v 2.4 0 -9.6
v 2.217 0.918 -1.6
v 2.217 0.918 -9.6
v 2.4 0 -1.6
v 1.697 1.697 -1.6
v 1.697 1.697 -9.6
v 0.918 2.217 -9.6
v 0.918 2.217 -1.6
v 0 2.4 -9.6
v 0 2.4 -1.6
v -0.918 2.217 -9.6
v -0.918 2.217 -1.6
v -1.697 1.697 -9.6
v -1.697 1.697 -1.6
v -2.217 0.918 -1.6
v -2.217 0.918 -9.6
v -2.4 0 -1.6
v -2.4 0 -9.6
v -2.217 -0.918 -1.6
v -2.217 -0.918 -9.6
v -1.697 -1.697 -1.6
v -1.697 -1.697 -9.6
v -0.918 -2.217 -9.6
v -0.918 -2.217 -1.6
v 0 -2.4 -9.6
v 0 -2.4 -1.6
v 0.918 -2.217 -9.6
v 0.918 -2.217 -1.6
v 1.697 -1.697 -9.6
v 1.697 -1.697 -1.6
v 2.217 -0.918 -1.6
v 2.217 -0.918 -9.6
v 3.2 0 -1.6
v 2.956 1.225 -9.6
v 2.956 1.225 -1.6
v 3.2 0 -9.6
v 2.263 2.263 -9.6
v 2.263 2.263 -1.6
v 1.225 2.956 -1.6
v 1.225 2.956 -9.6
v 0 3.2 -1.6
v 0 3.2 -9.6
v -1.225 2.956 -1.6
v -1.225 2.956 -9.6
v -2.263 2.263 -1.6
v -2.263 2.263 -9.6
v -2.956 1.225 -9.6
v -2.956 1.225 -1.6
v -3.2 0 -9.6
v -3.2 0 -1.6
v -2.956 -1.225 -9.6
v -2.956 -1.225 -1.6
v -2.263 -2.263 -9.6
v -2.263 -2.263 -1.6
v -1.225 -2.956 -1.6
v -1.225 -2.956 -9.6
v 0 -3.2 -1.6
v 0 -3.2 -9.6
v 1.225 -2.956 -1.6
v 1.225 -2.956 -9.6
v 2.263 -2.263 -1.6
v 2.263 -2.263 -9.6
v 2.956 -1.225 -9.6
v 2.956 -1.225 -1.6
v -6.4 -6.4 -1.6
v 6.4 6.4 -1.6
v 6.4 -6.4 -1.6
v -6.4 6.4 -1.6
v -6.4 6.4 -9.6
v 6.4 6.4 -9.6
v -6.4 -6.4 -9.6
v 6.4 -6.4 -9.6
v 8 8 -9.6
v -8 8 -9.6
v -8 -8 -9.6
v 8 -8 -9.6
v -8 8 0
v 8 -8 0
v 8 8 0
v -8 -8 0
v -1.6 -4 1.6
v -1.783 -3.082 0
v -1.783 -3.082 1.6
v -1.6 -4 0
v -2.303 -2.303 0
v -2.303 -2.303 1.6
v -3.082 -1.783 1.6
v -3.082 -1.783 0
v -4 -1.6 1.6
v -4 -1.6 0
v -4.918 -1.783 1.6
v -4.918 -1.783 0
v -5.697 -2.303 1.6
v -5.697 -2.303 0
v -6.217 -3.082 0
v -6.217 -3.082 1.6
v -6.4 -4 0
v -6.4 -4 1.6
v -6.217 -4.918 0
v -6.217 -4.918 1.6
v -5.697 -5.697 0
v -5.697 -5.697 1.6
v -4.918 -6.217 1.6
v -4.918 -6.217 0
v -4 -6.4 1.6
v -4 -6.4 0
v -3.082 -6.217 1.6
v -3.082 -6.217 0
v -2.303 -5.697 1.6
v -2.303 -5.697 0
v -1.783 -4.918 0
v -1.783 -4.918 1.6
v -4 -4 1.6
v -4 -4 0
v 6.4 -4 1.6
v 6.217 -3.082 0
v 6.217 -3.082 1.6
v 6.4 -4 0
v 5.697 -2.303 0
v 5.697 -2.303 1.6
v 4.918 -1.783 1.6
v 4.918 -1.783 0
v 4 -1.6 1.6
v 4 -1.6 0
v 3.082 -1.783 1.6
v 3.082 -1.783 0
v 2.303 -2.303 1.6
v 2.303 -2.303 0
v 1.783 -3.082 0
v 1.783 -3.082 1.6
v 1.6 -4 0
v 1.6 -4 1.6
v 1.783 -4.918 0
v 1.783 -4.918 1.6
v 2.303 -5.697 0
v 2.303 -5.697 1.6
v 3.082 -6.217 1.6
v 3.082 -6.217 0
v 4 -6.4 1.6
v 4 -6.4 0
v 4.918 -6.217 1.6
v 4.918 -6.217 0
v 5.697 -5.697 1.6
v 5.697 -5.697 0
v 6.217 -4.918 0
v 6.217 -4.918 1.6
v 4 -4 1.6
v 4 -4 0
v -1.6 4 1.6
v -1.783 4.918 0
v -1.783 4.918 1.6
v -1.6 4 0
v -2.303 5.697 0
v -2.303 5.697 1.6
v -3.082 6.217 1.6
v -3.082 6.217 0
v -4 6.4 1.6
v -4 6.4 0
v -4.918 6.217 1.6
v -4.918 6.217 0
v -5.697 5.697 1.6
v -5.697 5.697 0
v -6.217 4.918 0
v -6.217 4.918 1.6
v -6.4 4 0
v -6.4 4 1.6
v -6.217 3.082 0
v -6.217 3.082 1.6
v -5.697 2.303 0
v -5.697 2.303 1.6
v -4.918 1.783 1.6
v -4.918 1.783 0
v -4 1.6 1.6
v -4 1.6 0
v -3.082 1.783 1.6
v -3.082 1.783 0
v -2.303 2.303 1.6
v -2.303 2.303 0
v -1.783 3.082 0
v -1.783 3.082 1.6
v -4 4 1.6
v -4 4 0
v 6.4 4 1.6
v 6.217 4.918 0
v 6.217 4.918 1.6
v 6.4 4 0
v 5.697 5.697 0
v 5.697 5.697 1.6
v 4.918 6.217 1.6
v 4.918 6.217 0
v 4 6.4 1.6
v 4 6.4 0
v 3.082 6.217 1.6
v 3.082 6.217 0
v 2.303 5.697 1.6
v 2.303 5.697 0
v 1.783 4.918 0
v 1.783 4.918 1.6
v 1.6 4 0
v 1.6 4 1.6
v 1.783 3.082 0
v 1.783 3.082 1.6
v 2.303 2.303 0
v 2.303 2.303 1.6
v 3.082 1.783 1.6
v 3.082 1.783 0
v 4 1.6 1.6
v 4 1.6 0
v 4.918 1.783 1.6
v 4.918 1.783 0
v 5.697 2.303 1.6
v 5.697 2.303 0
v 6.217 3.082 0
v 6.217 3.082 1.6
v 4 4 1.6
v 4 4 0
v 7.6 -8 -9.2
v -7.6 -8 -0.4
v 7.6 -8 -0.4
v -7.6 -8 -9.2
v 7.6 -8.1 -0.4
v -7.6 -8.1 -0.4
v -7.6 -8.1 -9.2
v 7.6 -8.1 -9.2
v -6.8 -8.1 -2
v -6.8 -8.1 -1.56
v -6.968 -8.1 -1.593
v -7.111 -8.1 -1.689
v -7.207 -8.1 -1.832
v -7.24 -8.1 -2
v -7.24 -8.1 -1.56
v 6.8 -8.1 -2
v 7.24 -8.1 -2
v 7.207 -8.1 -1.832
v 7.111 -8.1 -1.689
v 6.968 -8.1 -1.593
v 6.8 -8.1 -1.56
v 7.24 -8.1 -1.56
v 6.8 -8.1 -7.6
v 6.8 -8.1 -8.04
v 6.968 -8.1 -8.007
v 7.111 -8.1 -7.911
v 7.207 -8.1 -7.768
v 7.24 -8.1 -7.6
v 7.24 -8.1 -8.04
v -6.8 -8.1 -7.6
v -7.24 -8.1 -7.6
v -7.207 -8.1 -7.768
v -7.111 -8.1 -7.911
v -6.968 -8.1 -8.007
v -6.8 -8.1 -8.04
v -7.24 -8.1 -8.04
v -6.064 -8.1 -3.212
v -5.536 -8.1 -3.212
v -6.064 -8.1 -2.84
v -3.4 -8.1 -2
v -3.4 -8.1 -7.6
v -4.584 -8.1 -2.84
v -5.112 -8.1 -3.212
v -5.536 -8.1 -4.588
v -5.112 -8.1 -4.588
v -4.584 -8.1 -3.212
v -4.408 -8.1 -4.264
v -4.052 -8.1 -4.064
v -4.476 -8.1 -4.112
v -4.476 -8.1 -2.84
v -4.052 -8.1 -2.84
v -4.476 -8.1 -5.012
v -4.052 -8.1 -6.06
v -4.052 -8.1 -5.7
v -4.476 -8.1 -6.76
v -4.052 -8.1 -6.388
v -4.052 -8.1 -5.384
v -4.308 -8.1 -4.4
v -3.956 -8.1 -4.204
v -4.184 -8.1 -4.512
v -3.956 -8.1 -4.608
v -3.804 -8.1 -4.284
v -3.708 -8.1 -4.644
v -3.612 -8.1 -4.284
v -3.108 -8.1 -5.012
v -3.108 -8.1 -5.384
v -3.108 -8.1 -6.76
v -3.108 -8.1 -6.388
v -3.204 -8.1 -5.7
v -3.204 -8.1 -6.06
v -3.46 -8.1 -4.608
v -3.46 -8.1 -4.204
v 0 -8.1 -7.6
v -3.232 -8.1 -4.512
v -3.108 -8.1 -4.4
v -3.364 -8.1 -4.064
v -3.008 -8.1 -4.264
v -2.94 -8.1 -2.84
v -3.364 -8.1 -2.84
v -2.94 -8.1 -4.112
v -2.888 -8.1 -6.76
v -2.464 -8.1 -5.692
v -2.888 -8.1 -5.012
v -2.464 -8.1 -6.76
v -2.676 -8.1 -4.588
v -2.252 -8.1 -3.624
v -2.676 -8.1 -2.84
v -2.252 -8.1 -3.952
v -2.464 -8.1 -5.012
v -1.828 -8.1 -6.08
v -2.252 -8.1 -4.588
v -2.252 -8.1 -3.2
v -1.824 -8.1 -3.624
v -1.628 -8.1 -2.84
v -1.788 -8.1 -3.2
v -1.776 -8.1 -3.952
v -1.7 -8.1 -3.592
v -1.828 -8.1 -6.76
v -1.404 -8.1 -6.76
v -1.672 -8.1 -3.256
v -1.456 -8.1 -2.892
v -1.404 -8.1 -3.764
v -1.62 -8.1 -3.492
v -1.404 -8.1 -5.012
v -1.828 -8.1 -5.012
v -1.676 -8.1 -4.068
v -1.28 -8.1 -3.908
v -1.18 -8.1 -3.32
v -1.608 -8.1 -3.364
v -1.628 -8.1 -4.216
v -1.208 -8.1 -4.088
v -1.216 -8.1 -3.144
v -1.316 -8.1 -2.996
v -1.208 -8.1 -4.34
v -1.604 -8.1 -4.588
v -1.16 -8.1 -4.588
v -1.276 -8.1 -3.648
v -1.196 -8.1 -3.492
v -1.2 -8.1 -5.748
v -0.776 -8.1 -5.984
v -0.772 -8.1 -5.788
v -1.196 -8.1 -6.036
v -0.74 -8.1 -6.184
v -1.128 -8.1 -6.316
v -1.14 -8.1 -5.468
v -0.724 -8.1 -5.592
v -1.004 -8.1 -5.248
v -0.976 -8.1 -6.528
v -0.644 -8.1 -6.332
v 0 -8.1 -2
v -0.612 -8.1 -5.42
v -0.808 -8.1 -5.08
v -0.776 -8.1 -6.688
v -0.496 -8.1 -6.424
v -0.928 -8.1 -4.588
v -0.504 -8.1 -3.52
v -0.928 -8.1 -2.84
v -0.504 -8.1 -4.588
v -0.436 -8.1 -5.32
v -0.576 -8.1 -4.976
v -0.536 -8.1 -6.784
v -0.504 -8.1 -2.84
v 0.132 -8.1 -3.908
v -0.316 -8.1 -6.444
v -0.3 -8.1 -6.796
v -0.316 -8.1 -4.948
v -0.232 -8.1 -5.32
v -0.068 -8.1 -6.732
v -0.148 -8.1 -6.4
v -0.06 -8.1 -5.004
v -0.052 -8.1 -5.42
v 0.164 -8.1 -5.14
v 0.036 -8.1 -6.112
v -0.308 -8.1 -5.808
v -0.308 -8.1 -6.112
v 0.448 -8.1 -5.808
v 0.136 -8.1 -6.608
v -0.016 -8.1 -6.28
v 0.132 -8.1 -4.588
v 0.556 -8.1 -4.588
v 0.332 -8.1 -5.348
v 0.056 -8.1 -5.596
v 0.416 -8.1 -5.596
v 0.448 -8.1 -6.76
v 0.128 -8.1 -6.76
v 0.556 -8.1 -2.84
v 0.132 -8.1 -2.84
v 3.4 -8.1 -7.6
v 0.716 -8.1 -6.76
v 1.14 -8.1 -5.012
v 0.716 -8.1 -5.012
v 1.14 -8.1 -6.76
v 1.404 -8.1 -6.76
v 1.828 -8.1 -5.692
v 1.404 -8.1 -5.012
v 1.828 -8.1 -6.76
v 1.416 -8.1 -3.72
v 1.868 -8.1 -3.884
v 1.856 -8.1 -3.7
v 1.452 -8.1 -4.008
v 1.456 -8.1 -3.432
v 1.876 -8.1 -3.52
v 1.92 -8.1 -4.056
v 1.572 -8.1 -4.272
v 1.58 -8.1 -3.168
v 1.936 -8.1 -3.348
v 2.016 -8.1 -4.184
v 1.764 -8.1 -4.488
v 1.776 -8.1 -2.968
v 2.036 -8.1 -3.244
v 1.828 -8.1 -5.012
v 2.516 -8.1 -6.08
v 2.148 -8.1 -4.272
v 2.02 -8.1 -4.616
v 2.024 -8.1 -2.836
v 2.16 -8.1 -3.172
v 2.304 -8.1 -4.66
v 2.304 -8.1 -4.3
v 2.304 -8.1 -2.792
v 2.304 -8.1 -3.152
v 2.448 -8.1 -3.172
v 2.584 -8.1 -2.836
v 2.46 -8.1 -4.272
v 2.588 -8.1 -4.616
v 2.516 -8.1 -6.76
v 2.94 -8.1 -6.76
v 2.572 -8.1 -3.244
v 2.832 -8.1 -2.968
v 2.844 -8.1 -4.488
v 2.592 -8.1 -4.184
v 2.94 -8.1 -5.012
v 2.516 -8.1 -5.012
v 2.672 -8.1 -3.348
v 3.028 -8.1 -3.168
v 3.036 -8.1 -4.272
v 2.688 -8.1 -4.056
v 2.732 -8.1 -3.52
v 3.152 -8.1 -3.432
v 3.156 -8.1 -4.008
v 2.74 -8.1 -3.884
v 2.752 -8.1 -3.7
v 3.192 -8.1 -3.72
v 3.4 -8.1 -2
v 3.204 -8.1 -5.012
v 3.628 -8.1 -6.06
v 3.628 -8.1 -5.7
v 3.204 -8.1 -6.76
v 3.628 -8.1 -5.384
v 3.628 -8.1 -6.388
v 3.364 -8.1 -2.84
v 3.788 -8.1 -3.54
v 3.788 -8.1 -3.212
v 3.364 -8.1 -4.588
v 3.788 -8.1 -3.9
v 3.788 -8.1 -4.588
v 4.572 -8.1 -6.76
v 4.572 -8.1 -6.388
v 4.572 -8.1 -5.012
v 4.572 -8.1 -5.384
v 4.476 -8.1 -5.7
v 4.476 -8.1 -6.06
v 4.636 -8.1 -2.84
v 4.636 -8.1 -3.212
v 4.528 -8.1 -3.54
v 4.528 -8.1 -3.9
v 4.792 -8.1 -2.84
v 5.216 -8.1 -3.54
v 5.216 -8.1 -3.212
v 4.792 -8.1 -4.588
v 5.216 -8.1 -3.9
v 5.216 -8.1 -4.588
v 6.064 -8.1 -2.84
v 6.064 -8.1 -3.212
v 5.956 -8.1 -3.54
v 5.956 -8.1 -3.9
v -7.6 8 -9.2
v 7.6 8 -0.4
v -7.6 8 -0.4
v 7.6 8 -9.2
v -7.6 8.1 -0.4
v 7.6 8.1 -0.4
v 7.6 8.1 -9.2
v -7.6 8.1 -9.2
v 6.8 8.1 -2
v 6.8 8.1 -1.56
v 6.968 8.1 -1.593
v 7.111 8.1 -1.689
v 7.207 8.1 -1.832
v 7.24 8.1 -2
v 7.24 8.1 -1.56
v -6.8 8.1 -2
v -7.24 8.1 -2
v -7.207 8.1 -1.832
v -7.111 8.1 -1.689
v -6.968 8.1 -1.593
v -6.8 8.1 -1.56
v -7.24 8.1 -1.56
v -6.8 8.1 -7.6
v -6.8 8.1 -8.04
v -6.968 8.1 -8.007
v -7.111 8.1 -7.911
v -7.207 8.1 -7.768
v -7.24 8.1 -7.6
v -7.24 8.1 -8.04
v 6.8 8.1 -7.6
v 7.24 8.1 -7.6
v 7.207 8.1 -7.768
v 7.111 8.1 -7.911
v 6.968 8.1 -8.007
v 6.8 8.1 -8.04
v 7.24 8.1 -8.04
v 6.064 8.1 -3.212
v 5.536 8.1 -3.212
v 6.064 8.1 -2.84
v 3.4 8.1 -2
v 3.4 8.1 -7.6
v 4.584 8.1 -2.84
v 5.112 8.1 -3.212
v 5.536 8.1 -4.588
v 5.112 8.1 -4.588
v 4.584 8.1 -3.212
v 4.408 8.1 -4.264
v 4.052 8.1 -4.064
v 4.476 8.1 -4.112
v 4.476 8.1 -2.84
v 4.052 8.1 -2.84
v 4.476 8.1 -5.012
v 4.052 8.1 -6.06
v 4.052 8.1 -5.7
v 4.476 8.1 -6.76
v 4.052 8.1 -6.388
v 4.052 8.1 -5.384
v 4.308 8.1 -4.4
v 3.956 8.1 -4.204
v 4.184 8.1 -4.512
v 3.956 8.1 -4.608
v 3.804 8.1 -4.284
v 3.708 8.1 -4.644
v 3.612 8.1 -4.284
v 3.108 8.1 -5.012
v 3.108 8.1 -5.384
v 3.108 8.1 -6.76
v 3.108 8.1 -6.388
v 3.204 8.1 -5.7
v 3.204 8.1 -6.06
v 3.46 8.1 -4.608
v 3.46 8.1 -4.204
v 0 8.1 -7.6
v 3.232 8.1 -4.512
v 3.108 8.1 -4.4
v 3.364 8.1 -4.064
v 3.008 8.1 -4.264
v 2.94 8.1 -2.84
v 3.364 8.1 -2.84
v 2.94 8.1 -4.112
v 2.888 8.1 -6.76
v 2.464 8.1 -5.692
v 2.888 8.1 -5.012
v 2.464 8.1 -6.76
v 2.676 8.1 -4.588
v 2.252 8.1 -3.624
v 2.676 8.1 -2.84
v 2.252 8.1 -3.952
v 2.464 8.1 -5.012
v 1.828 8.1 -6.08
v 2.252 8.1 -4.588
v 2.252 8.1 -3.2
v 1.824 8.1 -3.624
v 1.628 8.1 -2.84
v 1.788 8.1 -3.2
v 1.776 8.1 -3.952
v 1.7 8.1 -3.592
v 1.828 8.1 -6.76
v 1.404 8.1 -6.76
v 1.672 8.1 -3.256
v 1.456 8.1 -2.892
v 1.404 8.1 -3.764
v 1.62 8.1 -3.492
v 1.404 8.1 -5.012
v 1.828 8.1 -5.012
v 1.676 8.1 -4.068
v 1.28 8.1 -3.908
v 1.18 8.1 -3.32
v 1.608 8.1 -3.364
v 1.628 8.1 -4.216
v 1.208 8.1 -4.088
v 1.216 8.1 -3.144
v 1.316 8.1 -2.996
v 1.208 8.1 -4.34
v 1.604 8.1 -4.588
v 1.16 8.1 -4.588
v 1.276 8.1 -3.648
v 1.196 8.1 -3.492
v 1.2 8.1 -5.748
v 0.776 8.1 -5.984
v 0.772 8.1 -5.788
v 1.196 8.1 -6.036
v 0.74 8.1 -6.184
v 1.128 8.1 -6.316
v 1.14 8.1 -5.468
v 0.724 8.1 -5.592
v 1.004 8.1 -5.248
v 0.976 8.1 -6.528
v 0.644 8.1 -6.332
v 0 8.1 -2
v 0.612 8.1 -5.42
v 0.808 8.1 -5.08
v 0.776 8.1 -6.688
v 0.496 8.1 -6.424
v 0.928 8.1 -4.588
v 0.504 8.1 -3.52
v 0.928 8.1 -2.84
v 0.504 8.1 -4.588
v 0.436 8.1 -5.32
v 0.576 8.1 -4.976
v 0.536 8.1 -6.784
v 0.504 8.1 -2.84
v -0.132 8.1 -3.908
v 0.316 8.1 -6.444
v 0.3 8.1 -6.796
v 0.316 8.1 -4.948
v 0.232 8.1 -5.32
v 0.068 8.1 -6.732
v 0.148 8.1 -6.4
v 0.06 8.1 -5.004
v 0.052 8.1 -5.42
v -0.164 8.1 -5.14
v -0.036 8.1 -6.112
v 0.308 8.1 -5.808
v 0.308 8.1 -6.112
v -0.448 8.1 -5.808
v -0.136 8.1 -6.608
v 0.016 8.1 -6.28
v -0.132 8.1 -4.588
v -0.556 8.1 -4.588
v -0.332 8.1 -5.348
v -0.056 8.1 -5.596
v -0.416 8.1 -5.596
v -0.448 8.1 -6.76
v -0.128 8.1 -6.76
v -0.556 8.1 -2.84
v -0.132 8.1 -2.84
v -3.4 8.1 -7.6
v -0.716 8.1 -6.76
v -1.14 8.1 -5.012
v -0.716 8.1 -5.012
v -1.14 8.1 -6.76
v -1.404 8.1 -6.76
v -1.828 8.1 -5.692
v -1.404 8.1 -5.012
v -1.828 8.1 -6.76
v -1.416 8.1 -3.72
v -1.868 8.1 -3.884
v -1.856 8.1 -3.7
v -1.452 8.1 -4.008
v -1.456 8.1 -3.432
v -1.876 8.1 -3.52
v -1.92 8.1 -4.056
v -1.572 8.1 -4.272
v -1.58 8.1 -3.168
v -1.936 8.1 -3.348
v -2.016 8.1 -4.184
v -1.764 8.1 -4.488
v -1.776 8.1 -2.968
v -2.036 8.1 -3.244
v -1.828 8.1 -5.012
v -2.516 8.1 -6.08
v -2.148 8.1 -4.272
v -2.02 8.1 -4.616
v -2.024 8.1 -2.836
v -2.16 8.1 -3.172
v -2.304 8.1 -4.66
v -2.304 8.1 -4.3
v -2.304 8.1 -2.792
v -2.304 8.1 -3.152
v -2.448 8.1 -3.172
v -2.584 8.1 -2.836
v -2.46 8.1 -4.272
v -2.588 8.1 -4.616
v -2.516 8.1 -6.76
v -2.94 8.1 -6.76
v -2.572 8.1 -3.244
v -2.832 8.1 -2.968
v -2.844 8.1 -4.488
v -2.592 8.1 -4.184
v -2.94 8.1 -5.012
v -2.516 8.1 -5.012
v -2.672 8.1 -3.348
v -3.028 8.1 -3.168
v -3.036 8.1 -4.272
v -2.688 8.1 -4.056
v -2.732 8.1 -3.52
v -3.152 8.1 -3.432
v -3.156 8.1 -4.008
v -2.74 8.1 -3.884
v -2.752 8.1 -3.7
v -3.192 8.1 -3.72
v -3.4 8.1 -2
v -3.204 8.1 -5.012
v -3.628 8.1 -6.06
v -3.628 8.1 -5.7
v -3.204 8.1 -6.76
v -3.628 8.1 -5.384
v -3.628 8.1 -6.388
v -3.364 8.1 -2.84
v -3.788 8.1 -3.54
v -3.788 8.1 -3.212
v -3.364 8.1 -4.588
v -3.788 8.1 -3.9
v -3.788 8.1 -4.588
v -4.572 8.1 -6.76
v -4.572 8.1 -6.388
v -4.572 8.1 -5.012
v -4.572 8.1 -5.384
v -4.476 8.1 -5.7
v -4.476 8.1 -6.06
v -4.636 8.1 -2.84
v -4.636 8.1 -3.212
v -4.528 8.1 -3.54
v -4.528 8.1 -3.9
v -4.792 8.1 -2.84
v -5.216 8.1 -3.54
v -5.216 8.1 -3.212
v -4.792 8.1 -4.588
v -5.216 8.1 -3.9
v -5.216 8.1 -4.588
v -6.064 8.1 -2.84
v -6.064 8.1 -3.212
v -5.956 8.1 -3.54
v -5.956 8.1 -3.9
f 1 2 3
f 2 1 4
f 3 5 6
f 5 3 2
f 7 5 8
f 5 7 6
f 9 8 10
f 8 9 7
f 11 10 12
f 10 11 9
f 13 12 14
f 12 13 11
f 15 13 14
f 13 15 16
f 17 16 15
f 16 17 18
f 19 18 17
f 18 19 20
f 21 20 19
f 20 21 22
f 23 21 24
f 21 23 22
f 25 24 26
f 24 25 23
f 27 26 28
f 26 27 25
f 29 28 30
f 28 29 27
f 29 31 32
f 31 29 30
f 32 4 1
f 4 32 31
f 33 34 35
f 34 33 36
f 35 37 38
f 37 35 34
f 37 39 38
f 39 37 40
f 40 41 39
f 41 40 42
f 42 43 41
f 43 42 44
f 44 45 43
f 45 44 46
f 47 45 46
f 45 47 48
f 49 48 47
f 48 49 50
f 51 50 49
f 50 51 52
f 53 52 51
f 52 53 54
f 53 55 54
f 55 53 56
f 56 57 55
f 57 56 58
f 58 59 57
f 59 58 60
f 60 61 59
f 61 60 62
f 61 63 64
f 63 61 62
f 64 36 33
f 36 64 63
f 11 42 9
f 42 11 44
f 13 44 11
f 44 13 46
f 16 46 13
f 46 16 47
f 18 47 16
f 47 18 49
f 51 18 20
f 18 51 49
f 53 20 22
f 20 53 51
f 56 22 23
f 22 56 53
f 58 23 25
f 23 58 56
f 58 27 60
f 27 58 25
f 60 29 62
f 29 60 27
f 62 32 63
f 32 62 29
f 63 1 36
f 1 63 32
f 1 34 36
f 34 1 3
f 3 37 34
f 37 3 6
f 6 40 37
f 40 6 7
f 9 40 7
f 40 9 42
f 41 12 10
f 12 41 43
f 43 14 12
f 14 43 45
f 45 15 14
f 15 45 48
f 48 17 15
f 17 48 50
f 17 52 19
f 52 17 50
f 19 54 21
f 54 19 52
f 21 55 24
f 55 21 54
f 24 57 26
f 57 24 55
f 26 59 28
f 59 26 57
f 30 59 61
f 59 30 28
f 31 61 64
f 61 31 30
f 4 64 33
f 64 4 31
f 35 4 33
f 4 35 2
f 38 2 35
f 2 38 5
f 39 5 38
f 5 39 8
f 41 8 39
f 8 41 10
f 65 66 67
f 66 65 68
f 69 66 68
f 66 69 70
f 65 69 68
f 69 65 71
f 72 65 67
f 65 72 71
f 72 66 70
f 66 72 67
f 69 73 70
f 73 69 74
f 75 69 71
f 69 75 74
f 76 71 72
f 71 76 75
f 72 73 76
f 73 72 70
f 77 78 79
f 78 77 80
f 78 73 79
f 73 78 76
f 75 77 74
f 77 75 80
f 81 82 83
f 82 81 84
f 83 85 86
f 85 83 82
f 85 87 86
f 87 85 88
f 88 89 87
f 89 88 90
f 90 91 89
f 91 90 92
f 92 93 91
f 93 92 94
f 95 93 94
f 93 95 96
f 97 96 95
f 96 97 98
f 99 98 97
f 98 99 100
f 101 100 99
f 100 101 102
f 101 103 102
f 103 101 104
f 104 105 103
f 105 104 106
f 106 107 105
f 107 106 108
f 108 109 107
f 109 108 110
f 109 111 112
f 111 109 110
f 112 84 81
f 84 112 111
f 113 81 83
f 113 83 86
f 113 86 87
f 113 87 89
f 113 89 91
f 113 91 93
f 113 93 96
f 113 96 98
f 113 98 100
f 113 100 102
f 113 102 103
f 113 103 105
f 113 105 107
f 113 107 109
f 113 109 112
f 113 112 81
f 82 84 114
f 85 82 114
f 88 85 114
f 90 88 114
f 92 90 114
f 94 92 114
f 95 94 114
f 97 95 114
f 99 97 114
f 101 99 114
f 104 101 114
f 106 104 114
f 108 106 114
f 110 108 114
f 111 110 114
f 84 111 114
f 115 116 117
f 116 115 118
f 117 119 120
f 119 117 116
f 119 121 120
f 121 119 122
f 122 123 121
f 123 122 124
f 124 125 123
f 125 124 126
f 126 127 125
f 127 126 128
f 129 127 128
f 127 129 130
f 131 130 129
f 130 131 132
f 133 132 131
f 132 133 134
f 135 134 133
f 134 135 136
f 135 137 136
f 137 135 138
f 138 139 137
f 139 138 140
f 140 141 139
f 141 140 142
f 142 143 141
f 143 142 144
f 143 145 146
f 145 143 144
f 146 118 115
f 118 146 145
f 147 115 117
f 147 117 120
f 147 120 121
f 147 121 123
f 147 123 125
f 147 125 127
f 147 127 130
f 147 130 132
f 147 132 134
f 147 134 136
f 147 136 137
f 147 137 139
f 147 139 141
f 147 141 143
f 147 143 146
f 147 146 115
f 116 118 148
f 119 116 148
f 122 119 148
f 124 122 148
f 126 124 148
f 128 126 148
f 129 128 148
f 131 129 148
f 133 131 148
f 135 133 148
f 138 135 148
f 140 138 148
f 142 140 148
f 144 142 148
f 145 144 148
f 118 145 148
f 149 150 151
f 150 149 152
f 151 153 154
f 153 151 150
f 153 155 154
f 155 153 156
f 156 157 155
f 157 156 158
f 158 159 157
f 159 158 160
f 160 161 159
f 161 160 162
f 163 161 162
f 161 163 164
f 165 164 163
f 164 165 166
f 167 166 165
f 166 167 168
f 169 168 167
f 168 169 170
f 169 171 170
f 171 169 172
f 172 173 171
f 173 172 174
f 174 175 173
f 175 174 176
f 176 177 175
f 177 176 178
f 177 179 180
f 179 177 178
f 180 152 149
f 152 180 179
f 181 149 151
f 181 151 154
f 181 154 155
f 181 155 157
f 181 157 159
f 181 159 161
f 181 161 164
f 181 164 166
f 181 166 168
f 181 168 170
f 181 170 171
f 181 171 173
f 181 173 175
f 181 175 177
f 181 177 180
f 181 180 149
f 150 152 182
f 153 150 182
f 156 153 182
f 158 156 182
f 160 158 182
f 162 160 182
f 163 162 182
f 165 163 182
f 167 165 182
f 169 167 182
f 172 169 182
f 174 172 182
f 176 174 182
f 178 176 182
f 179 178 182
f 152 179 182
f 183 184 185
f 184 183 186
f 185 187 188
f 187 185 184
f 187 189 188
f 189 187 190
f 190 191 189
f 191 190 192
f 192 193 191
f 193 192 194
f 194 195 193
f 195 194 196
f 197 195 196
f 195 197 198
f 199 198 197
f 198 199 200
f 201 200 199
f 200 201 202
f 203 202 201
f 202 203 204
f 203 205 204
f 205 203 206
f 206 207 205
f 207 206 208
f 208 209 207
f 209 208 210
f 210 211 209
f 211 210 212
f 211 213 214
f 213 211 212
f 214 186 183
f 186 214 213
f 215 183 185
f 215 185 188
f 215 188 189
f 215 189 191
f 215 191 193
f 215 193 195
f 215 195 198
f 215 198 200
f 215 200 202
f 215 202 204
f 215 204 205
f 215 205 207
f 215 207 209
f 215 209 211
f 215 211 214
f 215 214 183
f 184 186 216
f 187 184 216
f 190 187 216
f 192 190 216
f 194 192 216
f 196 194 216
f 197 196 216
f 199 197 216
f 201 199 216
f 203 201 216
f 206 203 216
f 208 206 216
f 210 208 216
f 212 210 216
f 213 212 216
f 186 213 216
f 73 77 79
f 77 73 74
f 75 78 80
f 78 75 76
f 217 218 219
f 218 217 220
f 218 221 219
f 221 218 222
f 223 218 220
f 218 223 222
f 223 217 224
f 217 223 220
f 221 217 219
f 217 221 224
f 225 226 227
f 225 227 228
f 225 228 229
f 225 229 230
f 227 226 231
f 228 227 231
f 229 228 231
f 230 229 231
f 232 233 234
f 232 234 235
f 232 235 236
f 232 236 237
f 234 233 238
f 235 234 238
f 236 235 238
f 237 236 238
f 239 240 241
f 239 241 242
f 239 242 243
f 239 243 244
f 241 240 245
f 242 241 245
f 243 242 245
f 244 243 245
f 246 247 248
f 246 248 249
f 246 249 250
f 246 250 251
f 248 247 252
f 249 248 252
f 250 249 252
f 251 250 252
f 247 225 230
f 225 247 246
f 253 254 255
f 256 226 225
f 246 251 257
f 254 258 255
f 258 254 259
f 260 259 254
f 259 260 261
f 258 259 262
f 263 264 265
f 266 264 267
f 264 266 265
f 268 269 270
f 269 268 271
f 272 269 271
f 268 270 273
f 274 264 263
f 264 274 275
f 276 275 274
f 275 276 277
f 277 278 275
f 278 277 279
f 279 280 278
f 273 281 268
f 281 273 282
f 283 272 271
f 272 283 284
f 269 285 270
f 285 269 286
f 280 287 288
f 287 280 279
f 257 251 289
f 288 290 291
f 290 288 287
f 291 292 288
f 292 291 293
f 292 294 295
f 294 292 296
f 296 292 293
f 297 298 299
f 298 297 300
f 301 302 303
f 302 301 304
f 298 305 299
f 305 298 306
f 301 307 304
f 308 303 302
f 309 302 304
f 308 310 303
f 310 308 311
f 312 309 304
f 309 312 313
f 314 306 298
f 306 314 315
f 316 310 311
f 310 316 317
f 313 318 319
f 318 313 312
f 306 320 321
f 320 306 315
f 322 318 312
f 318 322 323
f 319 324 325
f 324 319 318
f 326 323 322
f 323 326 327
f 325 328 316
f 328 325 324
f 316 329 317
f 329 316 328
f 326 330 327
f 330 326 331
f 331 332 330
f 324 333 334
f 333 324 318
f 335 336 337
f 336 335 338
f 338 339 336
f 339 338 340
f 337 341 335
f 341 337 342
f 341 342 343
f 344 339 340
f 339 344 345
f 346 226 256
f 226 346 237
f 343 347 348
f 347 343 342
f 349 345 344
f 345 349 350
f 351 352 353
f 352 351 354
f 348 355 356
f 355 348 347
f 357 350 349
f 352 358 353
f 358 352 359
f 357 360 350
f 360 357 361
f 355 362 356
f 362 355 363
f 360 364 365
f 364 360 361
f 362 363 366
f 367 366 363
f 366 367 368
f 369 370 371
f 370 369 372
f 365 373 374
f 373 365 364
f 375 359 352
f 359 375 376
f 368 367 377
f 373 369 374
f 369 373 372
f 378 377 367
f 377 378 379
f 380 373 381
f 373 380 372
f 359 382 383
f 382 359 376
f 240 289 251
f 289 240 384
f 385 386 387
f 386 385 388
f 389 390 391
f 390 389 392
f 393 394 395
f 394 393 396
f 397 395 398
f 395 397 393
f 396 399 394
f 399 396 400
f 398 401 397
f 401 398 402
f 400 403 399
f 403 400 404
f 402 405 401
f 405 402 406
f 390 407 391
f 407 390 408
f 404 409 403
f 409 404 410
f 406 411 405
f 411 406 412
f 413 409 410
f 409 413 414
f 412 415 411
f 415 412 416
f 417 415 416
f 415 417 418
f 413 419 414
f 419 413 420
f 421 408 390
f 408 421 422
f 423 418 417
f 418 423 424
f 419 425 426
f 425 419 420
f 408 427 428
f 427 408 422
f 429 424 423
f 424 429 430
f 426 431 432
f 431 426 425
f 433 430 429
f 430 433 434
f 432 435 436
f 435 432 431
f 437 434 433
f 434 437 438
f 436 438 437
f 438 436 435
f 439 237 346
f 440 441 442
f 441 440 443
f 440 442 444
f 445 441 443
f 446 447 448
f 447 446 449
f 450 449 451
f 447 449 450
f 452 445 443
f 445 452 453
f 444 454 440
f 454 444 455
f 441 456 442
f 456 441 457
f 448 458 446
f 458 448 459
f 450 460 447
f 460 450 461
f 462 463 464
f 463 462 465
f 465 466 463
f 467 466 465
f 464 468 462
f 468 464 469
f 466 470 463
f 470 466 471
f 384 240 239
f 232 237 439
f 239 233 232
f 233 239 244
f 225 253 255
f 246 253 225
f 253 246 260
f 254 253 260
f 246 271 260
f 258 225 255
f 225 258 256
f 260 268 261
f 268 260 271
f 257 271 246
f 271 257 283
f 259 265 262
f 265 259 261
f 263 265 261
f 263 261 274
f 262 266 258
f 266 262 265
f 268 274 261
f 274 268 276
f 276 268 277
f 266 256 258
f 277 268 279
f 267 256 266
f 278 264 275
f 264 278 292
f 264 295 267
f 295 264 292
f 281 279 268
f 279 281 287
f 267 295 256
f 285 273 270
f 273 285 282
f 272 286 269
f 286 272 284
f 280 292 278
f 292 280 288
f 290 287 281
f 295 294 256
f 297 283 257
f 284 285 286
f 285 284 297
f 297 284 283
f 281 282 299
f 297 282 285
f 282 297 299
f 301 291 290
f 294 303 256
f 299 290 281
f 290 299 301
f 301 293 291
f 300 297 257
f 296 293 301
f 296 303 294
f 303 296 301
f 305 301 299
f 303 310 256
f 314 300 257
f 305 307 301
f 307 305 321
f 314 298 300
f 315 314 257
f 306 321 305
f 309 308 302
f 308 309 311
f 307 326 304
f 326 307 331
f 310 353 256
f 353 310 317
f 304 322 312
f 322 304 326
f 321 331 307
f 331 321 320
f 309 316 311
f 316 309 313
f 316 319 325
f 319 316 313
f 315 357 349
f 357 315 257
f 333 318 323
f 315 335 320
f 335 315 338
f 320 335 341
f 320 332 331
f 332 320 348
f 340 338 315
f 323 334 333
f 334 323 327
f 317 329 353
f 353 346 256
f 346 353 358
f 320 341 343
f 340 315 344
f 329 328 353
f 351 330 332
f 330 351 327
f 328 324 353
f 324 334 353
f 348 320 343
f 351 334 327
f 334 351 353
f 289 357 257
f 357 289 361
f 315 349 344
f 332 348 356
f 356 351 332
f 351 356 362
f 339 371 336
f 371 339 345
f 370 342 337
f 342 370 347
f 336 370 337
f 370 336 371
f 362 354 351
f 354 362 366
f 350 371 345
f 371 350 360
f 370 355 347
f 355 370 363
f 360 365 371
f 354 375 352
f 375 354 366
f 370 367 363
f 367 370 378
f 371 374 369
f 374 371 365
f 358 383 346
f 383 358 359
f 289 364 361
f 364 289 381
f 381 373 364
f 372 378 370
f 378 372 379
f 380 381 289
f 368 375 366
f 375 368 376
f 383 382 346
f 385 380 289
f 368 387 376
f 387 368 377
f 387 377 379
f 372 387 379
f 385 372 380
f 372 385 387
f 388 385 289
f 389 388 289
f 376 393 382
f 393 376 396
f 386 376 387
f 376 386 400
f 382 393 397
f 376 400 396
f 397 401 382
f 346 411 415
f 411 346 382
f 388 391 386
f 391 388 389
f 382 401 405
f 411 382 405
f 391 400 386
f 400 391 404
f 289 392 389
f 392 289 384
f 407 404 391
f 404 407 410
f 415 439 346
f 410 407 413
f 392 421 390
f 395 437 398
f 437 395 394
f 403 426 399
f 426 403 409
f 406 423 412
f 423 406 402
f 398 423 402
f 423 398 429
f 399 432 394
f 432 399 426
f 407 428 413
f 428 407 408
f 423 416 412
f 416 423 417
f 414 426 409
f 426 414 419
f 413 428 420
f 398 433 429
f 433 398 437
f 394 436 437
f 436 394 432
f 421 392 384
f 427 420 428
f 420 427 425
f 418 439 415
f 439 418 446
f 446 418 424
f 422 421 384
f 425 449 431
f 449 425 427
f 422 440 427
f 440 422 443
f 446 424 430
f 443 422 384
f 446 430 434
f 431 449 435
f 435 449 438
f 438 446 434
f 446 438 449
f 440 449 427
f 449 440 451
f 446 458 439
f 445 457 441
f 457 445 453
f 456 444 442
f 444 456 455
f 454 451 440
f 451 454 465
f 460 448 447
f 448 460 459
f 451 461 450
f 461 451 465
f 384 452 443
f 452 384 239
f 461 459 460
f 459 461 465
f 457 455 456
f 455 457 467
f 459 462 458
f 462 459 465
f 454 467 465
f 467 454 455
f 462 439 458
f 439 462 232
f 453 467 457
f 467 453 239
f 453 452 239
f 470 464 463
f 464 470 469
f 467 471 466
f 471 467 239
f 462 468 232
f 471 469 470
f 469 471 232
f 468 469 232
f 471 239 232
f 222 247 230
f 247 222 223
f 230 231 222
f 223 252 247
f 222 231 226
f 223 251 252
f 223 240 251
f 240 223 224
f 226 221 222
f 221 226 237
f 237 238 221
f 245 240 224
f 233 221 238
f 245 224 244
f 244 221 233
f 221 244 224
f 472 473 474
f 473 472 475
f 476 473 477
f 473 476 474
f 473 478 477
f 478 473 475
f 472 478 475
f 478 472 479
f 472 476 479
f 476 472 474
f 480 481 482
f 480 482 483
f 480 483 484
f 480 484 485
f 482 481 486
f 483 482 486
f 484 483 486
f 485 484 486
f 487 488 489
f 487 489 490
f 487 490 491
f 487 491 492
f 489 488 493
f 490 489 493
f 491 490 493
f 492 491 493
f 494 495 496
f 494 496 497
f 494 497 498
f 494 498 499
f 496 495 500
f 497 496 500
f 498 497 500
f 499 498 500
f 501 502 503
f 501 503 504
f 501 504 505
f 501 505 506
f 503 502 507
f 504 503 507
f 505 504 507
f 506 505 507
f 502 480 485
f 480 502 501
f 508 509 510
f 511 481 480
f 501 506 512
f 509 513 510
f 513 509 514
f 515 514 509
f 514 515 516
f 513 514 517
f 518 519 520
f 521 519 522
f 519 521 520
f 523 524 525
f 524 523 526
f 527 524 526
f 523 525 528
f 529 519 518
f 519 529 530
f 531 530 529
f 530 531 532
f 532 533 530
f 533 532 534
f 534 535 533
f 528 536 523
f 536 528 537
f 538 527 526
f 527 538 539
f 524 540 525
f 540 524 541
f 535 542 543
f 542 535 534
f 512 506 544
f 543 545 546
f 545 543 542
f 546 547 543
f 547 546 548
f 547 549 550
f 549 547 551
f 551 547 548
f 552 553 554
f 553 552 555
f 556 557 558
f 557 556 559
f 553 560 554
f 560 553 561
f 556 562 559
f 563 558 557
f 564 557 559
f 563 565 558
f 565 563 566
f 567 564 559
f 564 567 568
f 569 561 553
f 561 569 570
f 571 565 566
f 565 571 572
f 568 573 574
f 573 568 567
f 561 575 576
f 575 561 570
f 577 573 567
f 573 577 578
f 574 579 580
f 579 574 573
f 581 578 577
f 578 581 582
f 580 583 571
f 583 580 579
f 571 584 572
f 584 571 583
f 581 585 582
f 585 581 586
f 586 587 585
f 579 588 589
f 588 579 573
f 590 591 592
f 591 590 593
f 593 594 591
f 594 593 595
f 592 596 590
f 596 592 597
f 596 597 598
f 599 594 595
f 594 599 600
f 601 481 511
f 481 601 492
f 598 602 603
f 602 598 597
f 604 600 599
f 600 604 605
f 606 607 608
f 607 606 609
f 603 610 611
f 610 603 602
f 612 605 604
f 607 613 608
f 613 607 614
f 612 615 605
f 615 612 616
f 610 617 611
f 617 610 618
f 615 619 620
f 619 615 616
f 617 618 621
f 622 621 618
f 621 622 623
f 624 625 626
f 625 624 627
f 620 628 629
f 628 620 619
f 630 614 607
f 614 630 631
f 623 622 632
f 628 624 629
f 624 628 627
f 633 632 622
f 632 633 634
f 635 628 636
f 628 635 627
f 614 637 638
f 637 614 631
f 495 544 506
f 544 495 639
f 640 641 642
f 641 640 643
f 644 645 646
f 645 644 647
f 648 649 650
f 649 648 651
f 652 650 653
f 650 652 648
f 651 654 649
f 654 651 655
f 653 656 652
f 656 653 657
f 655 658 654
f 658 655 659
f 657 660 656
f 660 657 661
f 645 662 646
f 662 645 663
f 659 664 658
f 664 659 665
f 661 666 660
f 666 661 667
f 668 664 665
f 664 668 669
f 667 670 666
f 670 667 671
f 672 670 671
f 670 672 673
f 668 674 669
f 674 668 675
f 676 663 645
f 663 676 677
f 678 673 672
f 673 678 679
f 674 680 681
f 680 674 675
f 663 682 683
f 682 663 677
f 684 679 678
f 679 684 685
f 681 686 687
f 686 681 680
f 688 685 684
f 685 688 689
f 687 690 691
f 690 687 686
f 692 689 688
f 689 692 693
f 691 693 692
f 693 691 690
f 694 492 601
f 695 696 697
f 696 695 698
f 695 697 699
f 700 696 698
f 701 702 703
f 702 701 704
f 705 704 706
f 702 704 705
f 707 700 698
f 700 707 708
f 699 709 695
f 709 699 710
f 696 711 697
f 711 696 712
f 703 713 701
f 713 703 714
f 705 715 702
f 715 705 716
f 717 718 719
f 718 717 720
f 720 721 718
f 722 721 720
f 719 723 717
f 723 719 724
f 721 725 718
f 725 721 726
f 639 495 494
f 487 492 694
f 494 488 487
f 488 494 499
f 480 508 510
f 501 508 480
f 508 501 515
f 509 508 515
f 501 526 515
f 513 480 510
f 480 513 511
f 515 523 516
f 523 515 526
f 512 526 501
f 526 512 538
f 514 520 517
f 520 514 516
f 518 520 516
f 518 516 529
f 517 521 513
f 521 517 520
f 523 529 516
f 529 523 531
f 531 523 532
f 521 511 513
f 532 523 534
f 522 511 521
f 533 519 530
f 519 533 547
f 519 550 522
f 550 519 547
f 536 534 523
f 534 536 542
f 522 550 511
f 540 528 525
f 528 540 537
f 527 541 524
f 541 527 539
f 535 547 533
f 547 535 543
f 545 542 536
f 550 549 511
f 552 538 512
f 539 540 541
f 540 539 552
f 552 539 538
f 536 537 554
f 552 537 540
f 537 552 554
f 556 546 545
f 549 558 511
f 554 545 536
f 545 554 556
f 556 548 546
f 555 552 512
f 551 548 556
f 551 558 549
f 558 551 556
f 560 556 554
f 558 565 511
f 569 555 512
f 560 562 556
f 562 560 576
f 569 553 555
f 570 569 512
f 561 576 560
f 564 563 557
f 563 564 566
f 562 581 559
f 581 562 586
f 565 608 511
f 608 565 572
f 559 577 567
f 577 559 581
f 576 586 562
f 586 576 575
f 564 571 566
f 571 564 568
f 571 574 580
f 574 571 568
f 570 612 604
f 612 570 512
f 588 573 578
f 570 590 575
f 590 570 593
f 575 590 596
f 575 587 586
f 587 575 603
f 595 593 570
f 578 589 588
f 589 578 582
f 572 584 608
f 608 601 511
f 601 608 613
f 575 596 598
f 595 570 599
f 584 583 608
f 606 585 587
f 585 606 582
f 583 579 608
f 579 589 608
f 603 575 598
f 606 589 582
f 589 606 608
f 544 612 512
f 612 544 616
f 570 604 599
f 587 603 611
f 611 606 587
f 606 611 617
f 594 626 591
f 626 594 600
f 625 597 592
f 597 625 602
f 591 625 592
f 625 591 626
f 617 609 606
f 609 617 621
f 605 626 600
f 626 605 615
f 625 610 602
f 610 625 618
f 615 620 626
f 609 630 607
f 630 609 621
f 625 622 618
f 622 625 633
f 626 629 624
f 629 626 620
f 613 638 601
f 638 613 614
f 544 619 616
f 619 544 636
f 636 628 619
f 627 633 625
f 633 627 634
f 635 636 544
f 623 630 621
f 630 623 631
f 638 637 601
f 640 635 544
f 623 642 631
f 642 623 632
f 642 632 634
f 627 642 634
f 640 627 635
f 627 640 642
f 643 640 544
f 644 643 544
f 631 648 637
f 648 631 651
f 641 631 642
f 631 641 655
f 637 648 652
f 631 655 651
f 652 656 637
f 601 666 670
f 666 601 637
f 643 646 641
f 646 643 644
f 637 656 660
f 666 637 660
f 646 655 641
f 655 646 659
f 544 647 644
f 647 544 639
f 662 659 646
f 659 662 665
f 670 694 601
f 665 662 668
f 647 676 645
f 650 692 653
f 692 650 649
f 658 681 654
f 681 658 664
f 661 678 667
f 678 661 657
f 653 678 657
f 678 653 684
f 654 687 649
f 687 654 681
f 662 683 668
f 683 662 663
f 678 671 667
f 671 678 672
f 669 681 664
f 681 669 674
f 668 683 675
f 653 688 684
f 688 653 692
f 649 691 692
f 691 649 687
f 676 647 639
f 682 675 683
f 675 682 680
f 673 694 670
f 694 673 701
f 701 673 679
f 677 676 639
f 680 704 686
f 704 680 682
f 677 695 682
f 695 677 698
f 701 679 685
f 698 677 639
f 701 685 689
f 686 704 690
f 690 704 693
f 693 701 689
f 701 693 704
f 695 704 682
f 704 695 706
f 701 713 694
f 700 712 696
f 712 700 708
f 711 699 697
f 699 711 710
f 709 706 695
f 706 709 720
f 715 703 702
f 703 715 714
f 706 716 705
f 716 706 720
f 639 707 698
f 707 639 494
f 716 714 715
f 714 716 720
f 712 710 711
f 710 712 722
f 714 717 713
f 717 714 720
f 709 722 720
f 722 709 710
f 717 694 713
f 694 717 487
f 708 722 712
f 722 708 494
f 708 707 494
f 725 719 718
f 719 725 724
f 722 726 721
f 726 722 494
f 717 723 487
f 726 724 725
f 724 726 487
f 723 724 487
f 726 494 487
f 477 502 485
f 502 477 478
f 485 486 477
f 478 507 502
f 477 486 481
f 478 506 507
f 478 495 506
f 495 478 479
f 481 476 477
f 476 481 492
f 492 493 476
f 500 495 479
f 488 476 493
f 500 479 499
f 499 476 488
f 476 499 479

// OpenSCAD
use <../lib.scad>
use <192375g.scad>
use <3003.scad>
function ldraw_lib__3003d02() = [
// 0 Brick  2 x  2 with "TURN OFF ENGINE" Sticker on Both Sides
// 0 Name: 3003d02.dat
// 0 Author: Takeshi Takahashi [RainbowDolphin]
// 0 !LDRAW_ORG Shortcut UPDATE 2024-05
// 0 !LICENSE Licensed under CC BY 4.0 : see CAreadme.txt
// 
// 0 BFC CERTIFY CCW
  [0,"BFC","CERTIFY"],
  [0,"BFC","CCW"],
// 
// 0 !CATEGORY Sticker Shortcut
// 0 !KEYWORDS Bricklink 3003pb020, Gas Station, Set 6375-2
// 
// 0 !HISTORY 2024-06-30 [OrionP] Official Update 2024-05
// 
// 1 16 0 0 0 1 0 0 0 1 0 0 0 1 3003.dat
  [1,16,0,0,0,1,0,0,0,1,0,0,0,1, ldraw_lib__3003()],
// 1 16 0 12 -20 1 0 0 0 0 -1 0 1 0 192375g.dat
  [1,16,0,12,-20,1,0,0,0,0,-1,0,1,0, ldraw_lib__192375g()],
// 1 16 0 12 20 -1 0 0 0 0 -1 0 -1 0 192375g.dat
  [1,16,0,12,20,-1,0,0,0,0,-1,0,-1,0, ldraw_lib__192375g()],
];
module ldraw_lib__3003d02(step=0, col=false, unit=2/5, alt=false, line=0.2, solid=!$preview)
    makepoly(ldraw_lib__3003d02(), step=step, col=col, unit=unit, alt=alt, line=line, solid=solid);
ldraw_lib__3003d02(line=0.2);
